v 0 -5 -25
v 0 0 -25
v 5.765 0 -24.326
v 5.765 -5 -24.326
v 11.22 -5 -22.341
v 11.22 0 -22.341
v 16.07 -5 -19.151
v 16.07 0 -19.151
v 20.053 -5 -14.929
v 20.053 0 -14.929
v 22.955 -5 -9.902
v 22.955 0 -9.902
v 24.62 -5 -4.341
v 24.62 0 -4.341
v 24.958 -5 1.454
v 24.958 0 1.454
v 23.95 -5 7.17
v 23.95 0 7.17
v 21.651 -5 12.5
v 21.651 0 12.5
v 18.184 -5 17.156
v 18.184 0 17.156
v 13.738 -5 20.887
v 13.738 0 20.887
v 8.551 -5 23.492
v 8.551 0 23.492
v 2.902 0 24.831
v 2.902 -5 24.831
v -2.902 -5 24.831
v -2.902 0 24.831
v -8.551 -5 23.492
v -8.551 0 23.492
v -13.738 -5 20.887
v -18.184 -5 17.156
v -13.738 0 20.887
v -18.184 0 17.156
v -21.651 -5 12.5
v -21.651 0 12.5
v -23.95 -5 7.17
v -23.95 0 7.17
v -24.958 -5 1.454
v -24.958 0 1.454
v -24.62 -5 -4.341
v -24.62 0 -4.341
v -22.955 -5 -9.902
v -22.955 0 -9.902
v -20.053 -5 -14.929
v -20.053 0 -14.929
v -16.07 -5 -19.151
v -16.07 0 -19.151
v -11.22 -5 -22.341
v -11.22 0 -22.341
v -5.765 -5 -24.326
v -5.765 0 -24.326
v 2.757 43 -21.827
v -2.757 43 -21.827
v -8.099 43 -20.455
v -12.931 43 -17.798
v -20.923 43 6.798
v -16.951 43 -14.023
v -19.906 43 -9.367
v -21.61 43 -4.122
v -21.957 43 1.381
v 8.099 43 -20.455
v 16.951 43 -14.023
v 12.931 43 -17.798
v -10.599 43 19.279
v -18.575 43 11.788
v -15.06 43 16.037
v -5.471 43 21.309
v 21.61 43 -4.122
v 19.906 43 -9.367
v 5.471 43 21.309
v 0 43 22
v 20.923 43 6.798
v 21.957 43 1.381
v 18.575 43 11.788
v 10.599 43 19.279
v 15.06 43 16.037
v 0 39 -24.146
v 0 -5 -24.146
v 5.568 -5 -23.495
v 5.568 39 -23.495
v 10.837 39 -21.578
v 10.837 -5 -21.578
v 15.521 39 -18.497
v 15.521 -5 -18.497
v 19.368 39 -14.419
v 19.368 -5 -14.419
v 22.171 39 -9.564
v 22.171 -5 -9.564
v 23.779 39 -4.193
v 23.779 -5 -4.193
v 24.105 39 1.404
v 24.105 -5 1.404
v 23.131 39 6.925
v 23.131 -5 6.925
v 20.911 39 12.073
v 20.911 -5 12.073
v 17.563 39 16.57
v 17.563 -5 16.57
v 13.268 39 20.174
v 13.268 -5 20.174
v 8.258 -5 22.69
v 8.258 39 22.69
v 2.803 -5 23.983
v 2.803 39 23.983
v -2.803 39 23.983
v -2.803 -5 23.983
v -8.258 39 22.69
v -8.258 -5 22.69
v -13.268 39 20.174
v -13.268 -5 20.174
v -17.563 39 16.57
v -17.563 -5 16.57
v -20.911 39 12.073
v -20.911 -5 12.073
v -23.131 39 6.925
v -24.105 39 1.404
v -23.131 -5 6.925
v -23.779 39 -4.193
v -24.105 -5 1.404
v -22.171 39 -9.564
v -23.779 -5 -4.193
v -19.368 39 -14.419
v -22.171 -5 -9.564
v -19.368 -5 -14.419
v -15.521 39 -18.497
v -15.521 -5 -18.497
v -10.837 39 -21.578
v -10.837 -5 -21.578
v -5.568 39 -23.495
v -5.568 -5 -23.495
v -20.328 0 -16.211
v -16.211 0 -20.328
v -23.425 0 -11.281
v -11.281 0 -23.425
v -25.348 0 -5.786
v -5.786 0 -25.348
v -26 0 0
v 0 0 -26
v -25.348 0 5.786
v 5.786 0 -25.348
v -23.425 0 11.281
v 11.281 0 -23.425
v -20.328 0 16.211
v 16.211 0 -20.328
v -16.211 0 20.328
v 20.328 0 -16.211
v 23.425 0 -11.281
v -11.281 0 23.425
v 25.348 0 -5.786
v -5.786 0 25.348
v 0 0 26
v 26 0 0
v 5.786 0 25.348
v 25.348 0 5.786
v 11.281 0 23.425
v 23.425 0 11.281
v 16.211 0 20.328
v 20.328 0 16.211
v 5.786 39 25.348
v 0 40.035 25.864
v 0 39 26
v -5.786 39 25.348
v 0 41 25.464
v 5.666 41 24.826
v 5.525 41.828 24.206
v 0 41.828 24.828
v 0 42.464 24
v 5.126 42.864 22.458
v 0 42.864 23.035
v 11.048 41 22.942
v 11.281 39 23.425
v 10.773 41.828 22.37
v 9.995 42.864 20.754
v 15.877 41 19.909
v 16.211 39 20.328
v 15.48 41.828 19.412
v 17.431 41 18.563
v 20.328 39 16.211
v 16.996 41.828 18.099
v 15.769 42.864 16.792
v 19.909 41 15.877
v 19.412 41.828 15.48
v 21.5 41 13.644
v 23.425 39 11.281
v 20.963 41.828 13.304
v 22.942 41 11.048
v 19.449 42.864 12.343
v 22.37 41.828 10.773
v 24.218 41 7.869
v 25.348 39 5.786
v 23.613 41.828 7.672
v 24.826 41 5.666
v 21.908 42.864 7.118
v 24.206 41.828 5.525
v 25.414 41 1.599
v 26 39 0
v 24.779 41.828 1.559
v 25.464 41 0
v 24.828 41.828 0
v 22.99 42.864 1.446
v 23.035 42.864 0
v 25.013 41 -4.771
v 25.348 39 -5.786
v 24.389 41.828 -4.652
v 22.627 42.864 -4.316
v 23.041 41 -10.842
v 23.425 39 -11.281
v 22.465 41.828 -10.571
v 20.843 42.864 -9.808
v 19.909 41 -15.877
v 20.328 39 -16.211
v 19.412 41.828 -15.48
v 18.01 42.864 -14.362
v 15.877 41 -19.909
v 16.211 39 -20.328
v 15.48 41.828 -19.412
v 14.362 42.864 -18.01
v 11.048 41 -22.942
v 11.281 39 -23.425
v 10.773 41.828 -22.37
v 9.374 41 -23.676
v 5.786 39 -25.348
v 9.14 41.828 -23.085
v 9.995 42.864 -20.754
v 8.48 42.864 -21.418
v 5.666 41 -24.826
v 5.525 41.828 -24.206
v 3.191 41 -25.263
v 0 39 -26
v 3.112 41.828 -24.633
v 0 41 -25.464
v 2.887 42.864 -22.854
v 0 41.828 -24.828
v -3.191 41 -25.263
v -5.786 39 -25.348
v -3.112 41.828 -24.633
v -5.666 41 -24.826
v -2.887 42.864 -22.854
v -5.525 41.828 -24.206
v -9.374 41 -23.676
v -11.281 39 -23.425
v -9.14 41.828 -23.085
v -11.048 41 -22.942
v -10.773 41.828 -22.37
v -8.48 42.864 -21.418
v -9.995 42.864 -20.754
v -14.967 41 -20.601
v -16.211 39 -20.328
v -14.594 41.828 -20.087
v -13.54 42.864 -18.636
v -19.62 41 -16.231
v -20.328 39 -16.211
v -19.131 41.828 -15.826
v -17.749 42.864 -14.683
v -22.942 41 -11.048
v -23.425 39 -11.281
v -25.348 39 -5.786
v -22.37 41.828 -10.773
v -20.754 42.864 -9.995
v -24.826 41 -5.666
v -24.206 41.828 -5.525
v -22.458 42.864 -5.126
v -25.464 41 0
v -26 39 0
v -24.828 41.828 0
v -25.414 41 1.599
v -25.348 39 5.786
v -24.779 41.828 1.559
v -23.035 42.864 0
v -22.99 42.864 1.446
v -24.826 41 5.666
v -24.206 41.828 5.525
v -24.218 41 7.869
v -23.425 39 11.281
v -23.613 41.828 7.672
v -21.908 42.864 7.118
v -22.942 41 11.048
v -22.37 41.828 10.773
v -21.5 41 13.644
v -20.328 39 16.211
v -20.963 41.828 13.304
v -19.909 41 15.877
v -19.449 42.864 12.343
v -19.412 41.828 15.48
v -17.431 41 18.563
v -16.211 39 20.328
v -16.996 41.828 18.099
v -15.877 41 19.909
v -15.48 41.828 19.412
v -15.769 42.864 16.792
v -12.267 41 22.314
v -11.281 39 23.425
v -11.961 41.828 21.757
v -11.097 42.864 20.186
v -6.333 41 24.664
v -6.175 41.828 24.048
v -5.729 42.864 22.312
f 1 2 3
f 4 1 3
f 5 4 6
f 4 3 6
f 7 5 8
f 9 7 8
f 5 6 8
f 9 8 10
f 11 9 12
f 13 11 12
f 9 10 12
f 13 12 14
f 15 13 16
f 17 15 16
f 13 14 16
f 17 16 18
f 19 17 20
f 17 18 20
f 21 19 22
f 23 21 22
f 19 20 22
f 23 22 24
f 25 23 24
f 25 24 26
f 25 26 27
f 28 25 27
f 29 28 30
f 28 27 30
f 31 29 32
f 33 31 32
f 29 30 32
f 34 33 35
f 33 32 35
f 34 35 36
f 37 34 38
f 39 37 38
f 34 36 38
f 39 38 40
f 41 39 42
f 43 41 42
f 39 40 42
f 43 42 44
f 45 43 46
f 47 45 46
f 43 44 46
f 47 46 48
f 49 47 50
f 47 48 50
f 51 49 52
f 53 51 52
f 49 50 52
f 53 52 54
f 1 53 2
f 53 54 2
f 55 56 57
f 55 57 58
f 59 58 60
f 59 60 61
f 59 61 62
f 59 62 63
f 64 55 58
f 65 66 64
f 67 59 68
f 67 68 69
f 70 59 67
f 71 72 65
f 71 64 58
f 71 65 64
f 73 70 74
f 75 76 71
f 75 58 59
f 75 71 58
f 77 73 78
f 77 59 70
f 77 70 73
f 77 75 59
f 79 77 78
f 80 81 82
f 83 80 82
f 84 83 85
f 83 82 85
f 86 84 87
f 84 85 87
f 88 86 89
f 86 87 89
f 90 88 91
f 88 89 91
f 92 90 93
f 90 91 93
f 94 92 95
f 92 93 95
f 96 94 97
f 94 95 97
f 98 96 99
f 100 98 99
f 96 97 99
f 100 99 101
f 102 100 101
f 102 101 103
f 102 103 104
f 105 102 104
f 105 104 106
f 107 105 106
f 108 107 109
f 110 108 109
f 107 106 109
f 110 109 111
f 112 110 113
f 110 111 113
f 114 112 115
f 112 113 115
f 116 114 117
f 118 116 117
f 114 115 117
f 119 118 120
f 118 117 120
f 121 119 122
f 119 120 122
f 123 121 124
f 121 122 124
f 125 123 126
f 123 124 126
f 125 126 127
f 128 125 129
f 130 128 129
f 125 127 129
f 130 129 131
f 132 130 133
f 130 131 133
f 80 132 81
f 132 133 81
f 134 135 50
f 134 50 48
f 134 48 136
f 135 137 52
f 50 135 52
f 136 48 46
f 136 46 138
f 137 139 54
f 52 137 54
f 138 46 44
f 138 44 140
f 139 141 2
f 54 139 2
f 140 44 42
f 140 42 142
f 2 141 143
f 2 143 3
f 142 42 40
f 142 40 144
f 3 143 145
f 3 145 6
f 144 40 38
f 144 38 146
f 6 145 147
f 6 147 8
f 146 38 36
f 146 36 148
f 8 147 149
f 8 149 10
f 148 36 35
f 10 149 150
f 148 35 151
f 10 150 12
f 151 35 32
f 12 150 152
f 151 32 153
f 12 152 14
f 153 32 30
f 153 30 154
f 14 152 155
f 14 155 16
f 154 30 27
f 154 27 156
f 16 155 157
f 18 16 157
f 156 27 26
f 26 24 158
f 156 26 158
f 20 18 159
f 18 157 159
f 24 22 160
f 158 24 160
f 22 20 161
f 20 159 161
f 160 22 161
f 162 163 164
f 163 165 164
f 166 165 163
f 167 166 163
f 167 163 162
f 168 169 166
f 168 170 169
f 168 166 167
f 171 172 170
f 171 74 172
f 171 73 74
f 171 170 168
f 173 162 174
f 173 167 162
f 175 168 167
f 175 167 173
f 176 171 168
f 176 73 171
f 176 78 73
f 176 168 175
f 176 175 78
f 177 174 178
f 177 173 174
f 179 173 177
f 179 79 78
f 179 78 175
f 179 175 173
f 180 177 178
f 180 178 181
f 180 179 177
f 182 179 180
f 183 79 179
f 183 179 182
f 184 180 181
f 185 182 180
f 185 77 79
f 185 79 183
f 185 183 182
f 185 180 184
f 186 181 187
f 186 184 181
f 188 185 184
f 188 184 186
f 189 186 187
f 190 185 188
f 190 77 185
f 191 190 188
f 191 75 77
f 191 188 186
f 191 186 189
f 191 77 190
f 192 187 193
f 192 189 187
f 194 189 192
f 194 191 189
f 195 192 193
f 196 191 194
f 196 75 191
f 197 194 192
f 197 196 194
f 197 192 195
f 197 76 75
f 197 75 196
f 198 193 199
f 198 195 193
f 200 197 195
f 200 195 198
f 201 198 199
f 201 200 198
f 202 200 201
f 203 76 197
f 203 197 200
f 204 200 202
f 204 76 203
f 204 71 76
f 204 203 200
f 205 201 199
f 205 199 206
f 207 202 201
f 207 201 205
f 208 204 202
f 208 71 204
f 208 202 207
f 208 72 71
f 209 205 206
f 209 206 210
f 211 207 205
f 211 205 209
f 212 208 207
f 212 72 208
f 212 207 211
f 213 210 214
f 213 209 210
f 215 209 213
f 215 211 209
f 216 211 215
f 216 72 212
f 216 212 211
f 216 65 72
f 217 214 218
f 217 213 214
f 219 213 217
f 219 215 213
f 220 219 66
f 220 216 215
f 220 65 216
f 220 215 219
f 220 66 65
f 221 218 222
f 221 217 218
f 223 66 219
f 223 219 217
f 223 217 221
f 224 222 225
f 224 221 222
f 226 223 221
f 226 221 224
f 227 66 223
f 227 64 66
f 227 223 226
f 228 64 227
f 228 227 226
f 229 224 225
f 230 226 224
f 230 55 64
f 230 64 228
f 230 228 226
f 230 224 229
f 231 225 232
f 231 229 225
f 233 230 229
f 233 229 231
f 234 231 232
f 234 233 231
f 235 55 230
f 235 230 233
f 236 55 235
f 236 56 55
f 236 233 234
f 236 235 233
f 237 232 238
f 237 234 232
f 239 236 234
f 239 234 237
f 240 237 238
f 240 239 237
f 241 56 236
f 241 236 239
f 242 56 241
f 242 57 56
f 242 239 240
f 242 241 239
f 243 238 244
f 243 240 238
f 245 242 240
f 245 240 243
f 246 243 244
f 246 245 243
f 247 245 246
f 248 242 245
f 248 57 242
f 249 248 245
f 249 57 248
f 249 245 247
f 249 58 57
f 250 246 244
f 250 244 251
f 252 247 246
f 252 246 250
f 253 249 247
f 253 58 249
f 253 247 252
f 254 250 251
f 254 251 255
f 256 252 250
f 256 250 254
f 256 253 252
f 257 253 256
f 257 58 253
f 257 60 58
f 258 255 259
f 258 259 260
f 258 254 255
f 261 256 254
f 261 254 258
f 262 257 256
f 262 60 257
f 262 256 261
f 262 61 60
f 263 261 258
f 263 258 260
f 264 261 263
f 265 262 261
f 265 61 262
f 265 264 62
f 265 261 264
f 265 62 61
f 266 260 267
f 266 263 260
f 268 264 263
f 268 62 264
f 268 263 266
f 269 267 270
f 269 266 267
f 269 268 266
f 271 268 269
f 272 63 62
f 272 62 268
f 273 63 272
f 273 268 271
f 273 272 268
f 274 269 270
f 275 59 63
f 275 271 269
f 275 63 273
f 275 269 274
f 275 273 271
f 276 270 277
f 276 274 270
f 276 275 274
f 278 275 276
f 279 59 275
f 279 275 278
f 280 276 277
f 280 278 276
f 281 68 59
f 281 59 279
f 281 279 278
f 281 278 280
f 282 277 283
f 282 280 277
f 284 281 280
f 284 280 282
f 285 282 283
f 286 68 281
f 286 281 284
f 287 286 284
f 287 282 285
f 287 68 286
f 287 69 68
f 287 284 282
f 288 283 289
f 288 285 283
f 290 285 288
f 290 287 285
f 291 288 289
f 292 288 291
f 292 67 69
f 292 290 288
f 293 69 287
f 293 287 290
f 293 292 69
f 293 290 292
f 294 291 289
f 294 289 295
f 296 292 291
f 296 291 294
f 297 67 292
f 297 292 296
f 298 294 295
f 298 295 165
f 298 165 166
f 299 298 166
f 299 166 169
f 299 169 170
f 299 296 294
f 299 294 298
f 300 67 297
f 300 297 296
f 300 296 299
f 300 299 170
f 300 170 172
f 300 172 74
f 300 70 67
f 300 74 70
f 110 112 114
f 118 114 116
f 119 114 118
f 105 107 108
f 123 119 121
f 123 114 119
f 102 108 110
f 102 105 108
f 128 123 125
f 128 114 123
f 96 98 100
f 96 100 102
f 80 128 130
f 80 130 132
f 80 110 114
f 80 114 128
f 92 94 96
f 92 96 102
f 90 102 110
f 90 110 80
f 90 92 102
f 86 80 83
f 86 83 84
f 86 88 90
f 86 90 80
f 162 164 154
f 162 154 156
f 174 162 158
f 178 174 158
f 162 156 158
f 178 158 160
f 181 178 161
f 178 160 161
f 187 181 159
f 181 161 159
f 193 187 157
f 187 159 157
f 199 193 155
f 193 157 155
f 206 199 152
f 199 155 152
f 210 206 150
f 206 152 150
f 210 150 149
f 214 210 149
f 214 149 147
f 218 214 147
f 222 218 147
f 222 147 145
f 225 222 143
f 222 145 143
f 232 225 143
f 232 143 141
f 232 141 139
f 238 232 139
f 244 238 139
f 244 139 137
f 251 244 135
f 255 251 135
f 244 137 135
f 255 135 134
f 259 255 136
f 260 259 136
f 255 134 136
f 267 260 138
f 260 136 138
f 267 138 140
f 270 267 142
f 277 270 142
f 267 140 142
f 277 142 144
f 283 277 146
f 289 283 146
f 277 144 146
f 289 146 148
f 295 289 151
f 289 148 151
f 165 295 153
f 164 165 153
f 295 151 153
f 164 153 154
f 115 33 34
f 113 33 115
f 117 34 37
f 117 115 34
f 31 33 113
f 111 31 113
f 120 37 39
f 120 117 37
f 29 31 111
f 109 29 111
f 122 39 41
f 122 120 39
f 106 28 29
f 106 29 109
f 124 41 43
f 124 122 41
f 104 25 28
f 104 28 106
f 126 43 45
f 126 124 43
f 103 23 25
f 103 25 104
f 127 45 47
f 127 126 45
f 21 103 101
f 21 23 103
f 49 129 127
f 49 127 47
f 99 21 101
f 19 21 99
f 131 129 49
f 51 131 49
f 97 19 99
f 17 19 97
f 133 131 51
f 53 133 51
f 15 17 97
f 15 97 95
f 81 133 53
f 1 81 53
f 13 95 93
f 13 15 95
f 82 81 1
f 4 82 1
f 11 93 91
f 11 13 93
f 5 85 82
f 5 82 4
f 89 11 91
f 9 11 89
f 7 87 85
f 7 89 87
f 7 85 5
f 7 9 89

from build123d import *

# Parameters (mm, degrees)
SKETCH1_R           = 26
BOSS_EXTRUDE1_DEPTH = 43
SKETCH2_R           = 25
BOSS_EXTRUDE2_DEPTH = 5
SKETCH3_R           = 24.145878613
CUT_EXTRUDE1_DEPTH  = 44
FILLET1_R           = 4


with BuildPart() as part:
    # Sketch1 → Boss-Extrude1 (new body)
    with BuildSketch(Plane(origin=(0, 0, 0), x_dir=(1, 0, 0), z_dir=(0, 1, 0))):
        with Locations(Location((0, 0, 0), (0, 0, 270))):
            Circle(SKETCH1_R)
    extrude(amount=BOSS_EXTRUDE1_DEPTH)

    # Sketch2 → Boss-Extrude2 (add)
    with BuildSketch(Plane.XZ):
        with Locations(Location((0, 0, 0), (0, 0, 270))):
            Circle(SKETCH2_R)
    extrude(amount=BOSS_EXTRUDE2_DEPTH)

    # Sketch3 → Cut-Extrude1 (cut)
    with BuildSketch(Plane.XZ.offset(5)):
        with Locations(Location((0, 0, 0), (0, 0, 270))):
            Circle(SKETCH3_R)
    extrude(amount=-CUT_EXTRUDE1_DEPTH, mode=Mode.SUBTRACT)

    # Fillet1
    fillet1_edges = [part.edges().sort_by_distance(p)[0] for p in [
        (0, 43, -26),
    ]]
    fillet(fillet1_edges, radius=FILLET1_R)


solid = part.part
